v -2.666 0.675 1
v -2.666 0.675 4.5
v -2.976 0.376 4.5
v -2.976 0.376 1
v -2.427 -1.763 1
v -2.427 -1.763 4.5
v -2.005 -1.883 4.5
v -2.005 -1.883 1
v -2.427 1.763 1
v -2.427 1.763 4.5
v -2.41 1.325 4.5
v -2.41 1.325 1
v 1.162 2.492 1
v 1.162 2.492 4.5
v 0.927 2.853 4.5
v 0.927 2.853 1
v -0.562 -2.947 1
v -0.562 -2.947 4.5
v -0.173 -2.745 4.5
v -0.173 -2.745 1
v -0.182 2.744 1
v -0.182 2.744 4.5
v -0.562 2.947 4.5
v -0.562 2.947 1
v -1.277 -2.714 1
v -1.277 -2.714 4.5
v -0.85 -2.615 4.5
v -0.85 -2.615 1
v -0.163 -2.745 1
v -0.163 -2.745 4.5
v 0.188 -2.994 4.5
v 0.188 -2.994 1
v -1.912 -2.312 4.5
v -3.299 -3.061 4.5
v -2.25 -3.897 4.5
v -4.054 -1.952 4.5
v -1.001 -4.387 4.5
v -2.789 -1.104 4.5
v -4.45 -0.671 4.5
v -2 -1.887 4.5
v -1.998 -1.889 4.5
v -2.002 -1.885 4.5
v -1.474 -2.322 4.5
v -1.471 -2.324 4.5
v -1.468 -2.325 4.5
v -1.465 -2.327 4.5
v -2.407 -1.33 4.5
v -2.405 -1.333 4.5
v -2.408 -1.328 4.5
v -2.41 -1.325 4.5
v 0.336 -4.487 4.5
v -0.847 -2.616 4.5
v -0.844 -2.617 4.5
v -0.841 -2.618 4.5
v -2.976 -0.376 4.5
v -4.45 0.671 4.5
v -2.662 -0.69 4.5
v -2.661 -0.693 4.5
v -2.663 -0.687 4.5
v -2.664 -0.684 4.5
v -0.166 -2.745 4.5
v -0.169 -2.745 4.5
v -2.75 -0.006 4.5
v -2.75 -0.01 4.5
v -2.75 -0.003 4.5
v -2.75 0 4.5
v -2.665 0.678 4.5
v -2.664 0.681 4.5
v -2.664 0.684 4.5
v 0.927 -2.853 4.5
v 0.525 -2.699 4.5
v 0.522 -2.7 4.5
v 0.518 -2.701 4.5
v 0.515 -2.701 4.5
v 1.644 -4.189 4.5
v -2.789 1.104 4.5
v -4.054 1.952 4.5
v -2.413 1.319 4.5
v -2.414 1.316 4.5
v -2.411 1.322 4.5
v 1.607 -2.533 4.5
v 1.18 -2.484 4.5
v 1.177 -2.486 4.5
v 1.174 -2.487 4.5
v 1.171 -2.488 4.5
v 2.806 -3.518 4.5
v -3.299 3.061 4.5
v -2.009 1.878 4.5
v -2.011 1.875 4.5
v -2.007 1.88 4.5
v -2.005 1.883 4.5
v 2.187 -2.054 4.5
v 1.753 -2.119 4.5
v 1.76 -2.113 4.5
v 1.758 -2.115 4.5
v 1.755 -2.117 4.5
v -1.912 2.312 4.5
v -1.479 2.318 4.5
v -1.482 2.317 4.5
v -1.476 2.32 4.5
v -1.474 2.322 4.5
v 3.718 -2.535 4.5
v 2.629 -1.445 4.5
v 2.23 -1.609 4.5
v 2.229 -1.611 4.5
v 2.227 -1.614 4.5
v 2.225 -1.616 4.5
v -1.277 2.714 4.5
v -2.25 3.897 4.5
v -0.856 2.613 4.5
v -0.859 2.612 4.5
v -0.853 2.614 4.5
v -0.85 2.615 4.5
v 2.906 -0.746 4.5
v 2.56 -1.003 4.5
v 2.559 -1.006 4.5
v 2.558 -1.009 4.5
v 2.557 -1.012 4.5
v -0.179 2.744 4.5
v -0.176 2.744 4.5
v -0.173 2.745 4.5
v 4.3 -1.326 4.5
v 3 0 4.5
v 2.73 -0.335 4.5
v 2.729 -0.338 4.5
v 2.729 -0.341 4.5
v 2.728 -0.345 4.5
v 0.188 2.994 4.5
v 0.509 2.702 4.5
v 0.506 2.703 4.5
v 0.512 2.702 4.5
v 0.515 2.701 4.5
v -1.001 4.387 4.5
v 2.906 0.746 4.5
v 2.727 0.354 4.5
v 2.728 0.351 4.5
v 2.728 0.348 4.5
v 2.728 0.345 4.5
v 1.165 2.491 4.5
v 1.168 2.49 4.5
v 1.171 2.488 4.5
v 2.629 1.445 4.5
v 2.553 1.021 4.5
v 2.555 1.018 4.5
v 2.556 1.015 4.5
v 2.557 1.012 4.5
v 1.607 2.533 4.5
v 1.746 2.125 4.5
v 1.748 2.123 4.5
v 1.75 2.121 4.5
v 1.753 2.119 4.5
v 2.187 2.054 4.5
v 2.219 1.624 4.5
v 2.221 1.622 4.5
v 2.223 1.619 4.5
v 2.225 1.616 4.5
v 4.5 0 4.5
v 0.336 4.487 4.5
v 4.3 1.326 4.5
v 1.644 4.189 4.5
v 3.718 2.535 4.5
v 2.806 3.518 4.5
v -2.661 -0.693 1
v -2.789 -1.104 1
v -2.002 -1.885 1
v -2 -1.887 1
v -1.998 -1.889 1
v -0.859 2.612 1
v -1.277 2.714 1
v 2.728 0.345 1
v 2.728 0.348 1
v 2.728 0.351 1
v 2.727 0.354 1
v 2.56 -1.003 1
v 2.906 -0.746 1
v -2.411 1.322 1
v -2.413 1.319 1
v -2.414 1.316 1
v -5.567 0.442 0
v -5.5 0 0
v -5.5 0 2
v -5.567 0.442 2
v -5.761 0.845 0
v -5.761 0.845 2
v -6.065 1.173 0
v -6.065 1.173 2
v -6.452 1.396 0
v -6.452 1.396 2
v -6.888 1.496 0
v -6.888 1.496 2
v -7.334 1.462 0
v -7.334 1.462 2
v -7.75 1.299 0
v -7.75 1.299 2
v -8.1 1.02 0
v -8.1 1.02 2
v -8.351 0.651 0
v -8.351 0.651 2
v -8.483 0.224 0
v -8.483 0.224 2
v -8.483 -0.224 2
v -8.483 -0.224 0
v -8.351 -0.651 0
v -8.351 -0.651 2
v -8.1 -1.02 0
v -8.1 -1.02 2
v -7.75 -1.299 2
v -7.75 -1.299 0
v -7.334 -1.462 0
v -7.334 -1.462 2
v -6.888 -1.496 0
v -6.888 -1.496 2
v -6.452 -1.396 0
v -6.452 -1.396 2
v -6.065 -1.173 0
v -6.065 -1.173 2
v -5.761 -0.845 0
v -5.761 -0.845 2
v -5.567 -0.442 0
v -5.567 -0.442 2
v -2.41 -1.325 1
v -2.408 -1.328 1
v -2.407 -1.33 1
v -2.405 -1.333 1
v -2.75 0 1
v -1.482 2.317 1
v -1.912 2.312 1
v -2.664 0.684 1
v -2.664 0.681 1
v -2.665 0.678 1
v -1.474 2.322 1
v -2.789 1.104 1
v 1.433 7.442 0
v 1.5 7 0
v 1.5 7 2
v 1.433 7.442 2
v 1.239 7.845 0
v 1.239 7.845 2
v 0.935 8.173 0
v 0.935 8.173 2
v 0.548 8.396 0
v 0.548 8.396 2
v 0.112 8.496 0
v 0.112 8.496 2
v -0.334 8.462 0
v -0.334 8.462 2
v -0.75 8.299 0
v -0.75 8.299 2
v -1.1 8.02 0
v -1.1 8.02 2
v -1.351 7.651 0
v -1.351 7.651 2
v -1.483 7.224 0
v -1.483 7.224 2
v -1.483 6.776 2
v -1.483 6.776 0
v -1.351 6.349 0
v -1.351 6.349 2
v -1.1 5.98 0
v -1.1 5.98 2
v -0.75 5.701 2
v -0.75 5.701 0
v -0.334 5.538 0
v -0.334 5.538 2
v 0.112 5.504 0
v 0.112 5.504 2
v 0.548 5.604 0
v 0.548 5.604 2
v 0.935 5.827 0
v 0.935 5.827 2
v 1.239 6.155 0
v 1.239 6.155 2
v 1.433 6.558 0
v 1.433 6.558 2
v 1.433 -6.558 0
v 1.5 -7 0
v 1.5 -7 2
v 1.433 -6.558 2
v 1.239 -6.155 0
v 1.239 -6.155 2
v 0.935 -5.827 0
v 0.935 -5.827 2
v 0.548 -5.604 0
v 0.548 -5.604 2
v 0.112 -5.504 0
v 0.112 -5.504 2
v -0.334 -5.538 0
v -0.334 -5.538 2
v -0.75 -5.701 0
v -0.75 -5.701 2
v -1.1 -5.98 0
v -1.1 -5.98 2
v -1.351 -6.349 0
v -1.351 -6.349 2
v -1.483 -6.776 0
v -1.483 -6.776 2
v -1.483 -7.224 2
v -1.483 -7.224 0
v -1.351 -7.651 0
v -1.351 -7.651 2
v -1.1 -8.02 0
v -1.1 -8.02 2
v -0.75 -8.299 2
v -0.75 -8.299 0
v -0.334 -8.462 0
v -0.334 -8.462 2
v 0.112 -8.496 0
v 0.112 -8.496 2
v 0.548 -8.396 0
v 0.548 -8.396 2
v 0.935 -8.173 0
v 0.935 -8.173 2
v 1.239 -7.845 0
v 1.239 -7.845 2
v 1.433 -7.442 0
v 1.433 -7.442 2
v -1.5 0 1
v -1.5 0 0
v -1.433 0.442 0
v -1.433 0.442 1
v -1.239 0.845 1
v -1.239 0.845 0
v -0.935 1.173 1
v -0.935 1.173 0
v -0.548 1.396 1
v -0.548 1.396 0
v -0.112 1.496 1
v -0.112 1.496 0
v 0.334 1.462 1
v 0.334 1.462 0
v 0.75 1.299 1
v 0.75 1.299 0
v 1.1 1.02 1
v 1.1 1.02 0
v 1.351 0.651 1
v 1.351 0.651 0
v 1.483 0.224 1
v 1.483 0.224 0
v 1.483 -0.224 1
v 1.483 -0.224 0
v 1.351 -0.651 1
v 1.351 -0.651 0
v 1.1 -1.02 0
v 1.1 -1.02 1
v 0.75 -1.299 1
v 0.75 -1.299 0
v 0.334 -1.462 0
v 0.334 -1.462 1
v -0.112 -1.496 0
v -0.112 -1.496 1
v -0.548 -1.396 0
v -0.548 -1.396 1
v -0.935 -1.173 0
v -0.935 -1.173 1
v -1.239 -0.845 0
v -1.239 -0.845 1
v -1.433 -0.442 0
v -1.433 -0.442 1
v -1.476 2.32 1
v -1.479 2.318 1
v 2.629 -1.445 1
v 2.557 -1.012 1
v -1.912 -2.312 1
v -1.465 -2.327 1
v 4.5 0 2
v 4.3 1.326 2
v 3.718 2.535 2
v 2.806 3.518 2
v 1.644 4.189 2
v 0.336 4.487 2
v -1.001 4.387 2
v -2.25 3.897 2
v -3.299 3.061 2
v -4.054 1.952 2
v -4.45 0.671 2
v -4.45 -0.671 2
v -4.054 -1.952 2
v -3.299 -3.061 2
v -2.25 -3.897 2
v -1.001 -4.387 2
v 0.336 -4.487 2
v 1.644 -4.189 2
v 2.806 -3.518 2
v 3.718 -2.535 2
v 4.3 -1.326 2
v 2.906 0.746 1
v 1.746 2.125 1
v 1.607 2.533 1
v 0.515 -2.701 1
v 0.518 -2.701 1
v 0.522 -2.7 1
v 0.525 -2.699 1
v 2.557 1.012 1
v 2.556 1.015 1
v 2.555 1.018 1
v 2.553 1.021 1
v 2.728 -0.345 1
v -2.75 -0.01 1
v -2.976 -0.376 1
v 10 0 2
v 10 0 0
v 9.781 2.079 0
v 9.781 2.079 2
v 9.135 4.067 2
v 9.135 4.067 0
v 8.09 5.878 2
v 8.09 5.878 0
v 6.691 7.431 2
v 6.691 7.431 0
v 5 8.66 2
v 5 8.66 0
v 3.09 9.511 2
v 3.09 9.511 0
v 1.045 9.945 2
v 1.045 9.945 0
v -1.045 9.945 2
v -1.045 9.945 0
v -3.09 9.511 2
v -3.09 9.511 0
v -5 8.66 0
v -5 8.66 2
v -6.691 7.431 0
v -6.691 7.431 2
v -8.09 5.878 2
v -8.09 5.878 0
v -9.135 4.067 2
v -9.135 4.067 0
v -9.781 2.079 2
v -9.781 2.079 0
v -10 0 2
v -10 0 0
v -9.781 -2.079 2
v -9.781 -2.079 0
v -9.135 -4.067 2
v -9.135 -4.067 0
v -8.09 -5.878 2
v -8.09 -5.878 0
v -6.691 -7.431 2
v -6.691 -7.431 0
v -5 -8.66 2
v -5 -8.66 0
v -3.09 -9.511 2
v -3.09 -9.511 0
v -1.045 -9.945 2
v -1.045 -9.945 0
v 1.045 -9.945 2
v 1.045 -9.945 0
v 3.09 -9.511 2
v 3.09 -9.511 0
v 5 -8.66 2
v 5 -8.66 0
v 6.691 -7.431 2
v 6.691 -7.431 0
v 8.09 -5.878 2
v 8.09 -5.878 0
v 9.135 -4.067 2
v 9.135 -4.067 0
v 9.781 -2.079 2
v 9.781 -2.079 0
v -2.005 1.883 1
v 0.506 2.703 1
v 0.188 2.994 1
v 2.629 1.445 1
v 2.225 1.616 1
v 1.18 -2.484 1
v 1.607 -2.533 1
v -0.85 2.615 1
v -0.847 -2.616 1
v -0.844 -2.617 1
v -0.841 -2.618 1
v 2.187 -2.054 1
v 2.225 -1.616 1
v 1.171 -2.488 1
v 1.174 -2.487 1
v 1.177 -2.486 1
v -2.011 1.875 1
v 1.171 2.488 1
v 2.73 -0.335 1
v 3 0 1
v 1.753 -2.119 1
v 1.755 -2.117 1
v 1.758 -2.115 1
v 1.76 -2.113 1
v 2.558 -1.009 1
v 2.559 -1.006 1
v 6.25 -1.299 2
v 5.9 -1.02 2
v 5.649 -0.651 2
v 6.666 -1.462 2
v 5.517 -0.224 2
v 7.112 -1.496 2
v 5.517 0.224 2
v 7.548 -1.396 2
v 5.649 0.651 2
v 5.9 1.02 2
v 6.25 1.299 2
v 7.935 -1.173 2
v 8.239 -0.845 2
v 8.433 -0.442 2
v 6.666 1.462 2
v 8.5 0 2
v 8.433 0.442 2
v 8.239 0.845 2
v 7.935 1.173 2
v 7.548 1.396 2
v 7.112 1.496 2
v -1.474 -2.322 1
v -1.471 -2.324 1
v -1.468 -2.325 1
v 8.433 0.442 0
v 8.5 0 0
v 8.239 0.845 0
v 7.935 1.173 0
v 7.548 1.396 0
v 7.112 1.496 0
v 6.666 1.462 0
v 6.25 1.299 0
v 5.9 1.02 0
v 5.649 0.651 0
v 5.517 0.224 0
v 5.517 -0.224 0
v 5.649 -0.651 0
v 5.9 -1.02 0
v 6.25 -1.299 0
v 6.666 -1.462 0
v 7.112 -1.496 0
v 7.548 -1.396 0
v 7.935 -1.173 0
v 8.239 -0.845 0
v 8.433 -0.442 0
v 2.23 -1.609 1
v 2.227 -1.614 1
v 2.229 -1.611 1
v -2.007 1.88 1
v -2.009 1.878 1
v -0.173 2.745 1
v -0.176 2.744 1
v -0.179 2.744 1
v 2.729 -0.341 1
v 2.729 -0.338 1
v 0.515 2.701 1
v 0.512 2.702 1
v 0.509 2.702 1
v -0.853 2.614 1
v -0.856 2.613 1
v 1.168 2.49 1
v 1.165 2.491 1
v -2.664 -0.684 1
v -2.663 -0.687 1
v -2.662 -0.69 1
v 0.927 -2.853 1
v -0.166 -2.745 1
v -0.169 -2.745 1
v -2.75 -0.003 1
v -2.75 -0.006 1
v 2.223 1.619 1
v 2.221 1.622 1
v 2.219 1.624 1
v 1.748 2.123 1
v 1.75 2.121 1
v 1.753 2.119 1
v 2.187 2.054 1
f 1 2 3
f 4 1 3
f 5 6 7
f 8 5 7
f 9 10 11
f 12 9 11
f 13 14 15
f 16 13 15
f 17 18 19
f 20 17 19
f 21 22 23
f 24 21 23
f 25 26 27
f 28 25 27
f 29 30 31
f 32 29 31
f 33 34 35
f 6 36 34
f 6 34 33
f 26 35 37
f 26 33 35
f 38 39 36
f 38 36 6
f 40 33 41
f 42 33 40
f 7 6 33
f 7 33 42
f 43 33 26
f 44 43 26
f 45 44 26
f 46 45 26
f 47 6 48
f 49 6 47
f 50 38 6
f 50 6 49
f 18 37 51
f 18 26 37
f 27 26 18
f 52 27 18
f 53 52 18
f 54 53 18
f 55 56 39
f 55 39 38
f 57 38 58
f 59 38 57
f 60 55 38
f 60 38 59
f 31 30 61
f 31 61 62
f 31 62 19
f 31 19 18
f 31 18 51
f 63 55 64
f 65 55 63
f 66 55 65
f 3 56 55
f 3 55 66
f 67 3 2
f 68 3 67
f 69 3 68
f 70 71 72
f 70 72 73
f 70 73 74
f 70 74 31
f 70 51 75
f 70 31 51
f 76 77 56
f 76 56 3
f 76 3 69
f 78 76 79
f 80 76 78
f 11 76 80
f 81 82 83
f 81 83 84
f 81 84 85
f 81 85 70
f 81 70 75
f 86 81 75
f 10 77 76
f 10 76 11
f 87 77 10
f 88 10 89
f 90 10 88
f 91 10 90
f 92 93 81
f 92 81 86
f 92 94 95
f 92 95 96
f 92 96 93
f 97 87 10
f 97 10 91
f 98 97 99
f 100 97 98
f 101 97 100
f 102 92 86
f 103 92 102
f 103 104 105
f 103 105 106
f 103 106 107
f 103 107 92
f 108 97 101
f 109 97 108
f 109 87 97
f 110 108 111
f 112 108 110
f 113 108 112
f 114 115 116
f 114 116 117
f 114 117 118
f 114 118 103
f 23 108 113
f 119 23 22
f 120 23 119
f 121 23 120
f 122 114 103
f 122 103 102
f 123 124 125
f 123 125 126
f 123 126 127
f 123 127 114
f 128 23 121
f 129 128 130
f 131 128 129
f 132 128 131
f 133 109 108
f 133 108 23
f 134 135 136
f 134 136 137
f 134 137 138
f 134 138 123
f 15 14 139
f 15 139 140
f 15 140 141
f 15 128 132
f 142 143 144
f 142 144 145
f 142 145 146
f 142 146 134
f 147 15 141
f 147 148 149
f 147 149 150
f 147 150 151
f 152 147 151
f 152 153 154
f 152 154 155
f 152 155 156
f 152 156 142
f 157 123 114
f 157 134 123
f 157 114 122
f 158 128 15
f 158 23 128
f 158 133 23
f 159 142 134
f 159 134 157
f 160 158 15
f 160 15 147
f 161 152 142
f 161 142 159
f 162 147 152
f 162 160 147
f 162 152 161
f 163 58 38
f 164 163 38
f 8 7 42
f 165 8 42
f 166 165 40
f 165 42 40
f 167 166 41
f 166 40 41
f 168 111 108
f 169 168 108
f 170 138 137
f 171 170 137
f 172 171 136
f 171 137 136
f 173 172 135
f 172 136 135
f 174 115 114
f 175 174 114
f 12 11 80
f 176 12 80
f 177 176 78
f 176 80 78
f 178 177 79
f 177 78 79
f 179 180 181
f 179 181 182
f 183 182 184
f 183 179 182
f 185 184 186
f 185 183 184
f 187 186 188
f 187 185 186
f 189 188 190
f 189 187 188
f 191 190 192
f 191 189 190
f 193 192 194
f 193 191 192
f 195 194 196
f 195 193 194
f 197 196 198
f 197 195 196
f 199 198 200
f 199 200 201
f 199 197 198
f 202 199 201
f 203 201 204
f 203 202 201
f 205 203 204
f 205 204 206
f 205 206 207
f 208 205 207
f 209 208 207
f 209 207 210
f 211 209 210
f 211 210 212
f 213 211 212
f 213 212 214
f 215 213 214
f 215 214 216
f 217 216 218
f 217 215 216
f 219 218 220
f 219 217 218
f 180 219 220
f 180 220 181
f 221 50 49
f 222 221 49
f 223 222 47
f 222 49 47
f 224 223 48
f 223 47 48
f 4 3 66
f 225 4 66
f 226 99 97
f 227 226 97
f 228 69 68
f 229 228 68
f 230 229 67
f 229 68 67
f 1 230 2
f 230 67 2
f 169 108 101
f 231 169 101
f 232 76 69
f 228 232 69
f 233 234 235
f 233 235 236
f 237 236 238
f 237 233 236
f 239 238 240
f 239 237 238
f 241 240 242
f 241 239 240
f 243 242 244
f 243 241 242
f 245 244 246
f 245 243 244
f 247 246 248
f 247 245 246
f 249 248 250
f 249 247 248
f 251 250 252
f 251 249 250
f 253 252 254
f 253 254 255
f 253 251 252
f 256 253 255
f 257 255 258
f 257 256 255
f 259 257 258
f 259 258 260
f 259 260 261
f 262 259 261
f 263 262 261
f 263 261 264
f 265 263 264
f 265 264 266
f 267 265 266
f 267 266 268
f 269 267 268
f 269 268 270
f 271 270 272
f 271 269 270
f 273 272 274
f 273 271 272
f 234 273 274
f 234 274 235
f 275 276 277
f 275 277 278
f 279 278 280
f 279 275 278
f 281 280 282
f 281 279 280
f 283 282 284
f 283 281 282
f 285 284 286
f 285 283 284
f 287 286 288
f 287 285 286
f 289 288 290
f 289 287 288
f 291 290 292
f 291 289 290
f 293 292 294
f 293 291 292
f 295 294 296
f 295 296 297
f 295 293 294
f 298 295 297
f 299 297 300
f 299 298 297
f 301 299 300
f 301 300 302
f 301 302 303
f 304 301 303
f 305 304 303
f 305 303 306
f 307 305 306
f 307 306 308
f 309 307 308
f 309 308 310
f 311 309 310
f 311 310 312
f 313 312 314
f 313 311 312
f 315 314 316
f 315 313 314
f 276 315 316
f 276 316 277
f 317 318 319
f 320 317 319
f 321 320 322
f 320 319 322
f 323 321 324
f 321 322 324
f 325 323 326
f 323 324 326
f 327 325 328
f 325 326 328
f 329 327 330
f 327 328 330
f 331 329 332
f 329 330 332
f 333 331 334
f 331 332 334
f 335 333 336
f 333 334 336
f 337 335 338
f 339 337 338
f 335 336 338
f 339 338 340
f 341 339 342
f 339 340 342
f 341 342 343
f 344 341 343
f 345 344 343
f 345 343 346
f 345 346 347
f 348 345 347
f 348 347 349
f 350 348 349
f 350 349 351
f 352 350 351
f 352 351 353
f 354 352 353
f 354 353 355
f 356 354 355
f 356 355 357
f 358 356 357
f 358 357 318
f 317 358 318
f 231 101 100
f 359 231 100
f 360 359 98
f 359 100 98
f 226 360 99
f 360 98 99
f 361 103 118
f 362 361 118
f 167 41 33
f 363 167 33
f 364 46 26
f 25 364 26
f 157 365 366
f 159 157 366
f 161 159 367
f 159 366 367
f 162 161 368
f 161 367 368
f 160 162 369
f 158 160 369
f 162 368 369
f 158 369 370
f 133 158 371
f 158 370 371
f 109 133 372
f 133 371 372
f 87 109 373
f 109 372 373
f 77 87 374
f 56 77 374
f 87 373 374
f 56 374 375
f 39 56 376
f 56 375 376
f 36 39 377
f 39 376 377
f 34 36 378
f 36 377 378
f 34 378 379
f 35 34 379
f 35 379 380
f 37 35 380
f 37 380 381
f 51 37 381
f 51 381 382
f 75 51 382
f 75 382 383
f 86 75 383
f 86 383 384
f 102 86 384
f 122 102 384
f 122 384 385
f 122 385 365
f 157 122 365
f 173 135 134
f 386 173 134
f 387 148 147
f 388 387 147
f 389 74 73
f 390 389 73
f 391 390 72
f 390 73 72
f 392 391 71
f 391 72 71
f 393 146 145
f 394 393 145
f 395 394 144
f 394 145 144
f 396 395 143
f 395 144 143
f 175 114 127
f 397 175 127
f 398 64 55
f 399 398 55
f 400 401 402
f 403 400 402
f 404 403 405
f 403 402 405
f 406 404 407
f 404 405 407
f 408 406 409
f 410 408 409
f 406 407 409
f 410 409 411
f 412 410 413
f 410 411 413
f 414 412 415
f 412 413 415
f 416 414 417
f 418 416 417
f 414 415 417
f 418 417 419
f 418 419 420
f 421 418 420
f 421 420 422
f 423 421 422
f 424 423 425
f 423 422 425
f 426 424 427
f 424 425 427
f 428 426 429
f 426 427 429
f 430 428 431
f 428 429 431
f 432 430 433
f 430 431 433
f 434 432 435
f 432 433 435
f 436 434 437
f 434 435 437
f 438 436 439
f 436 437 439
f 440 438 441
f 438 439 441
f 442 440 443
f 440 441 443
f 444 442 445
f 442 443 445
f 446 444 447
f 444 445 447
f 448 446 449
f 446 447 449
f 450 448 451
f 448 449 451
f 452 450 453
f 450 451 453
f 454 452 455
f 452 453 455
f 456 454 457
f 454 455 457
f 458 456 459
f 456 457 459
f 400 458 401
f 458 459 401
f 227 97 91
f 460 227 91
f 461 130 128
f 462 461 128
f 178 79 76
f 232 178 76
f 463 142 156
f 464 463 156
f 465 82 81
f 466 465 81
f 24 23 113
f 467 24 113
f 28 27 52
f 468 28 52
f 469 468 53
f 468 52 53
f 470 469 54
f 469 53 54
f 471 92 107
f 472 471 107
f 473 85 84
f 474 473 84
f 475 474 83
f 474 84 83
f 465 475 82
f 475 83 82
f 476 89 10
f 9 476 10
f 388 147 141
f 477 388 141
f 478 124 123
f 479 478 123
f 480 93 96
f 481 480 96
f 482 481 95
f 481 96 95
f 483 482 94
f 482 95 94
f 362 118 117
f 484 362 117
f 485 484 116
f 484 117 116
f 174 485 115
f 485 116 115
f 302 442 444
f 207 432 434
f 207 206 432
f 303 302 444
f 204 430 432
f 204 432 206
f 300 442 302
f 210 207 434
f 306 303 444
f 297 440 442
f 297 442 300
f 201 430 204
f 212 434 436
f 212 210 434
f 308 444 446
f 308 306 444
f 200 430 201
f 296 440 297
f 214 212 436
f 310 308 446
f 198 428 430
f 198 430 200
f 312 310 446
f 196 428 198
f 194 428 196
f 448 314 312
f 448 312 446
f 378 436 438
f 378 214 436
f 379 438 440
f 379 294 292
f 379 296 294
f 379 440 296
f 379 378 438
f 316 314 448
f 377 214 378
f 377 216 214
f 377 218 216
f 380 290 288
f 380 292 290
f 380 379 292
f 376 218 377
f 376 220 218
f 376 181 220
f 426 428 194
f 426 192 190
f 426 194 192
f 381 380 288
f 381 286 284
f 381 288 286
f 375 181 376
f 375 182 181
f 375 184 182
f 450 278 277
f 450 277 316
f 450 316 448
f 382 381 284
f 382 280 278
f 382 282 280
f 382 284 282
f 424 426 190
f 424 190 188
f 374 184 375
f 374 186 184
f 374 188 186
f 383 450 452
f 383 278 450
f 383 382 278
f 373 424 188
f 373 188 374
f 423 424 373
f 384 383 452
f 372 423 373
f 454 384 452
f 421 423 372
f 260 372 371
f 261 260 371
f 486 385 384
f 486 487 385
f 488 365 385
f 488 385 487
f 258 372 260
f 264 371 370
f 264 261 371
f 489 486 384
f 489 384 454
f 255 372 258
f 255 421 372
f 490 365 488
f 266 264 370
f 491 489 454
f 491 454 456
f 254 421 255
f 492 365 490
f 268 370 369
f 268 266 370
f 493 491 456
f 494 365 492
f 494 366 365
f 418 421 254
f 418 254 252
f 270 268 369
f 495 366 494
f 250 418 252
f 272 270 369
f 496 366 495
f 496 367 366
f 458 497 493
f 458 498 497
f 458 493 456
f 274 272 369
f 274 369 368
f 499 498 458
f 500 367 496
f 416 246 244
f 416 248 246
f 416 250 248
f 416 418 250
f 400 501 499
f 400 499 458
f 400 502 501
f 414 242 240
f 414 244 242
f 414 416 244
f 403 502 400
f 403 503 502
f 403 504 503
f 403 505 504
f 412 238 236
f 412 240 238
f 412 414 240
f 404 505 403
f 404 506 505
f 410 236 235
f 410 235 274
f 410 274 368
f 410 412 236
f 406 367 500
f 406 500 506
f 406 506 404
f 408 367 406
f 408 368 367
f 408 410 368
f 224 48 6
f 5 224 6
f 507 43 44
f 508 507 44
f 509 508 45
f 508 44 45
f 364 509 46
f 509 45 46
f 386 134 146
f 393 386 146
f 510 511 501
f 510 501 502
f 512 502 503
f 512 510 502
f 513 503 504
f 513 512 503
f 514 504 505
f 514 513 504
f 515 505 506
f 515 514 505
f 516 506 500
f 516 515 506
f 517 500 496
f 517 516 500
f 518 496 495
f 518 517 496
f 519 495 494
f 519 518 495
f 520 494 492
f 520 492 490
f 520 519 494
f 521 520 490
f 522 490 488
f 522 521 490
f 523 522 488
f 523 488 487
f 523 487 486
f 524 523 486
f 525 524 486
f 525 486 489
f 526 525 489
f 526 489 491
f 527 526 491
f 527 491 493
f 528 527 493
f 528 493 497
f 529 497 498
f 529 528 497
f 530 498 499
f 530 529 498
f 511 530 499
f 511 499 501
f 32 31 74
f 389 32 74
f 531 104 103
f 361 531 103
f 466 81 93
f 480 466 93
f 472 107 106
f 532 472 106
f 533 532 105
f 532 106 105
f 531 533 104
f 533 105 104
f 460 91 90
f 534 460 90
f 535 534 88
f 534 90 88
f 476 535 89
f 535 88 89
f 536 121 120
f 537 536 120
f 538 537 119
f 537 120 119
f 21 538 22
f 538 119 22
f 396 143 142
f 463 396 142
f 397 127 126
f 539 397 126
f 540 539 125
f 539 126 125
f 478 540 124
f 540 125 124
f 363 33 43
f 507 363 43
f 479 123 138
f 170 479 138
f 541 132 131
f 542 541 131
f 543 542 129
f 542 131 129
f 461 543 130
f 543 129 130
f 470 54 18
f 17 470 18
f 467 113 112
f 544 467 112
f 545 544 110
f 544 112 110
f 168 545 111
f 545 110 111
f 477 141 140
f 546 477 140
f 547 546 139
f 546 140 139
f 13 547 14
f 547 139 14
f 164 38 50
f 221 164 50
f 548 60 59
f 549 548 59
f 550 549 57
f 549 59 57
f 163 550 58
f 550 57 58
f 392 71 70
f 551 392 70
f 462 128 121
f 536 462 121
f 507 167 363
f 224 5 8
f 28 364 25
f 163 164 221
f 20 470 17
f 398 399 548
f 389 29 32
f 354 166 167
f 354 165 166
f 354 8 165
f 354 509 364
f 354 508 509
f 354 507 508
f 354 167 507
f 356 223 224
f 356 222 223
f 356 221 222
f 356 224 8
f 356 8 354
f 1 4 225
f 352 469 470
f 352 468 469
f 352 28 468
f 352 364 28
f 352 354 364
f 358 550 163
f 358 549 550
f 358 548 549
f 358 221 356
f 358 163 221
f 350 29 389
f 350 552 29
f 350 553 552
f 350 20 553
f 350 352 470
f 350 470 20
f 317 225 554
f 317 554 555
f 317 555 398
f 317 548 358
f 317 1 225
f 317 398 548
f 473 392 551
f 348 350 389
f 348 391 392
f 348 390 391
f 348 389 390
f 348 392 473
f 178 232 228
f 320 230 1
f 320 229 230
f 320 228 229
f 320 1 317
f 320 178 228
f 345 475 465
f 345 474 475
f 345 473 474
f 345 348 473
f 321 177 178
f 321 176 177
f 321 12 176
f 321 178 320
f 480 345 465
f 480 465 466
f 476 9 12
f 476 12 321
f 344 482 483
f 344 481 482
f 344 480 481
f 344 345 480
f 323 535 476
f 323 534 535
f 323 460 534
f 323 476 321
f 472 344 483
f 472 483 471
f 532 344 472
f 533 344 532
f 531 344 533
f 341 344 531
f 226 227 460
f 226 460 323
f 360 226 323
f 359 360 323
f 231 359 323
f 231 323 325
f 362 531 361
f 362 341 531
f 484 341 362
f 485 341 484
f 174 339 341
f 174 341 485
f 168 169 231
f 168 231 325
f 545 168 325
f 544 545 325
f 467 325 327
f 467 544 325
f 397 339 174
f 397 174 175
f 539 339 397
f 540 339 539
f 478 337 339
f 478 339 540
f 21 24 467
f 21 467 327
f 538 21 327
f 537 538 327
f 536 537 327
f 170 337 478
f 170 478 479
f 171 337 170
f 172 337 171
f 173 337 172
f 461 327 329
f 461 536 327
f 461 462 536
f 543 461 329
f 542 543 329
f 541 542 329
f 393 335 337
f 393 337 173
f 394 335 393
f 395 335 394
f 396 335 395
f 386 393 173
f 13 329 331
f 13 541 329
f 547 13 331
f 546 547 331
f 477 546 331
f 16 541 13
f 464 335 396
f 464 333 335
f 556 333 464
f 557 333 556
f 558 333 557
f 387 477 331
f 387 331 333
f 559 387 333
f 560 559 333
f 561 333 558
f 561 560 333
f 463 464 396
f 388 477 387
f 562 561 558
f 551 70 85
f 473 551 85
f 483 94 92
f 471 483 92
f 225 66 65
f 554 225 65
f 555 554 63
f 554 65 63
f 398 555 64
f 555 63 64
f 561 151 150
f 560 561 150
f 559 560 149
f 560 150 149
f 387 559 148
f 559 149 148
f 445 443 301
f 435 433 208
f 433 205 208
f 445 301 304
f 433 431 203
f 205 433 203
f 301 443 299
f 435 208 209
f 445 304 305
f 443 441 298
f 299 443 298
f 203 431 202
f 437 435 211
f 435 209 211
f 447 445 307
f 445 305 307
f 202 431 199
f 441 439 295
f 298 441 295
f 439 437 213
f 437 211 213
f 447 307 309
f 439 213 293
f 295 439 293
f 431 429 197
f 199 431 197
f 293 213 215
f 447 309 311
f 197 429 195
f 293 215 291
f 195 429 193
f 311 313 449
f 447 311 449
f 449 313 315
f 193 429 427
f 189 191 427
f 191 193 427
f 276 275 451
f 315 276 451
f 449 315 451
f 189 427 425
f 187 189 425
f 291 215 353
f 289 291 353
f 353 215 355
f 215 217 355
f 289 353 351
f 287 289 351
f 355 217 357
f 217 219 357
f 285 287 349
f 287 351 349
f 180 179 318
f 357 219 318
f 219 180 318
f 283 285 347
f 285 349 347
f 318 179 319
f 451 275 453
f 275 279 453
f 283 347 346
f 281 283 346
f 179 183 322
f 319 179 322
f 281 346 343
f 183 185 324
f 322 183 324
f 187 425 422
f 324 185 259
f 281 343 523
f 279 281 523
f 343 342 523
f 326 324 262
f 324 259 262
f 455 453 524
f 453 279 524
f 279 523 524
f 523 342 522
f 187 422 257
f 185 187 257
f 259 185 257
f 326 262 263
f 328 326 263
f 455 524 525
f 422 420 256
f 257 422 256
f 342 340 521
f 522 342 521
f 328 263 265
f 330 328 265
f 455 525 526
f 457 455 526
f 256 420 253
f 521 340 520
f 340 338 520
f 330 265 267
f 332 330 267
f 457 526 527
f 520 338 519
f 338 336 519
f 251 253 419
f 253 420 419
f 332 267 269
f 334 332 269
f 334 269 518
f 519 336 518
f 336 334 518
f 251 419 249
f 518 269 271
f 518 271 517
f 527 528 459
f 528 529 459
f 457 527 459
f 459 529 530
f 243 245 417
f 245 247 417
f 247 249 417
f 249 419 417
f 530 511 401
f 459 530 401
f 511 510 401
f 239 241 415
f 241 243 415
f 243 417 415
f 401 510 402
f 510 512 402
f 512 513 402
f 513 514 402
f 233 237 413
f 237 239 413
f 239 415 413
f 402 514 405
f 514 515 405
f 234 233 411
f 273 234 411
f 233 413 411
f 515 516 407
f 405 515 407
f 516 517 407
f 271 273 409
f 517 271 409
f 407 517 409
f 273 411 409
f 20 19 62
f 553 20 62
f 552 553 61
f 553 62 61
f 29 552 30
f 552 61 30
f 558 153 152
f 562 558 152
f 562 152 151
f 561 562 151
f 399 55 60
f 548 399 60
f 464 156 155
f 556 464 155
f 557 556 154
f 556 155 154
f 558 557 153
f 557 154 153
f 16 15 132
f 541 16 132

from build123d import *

# Parameters (mm, degrees)
SKETCH1_R           = 10
SKETCH1_R_2         = 1.5
SKETCH1_R_3         = 4.5
BOSS_EXTRUDE1_DEPTH = 2
SKETCH1_2_R         = 4.5
BOSS_EXTRUDE2_DEPTH = 4.5
SKETCH2_R           = 1.5
CUT_EXTRUDE1_DEPTH  = 4.5
SKETCH3_R           = 2.75
CUT_EXTRUDE2_DEPTH  = 3.5
CUT_EXTRUDE3_DEPTH  = 3.5
CIRPATTERN1_COUNT   = 25


with BuildPart() as part:
    # Sketch1 → Boss-Extrude1 (new body)
    with BuildSketch(Plane.XY):
        Circle(SKETCH1_R)
        with Locations((0, 7)):
            Circle(SKETCH1_R_2, mode=Mode.SUBTRACT)
        with Locations((7, 0)):
            Circle(SKETCH1_R_2, mode=Mode.SUBTRACT)
        with Locations((0, -7)):
            Circle(SKETCH1_R_2, mode=Mode.SUBTRACT)
        with Locations((-7, 0)):
            Circle(SKETCH1_R_2, mode=Mode.SUBTRACT)
        Circle(SKETCH1_R_3, mode=Mode.SUBTRACT)
    extrude(amount=BOSS_EXTRUDE1_DEPTH)

    # Sketch1<2> → Boss-Extrude2 (add)
    with BuildSketch(Plane.XY):
        Circle(SKETCH1_2_R)
    extrude(amount=BOSS_EXTRUDE2_DEPTH)

    # Sketch2 → Cut-Extrude1 (cut)
    with BuildSketch(Plane(origin=(0, 0, 0), x_dir=(-1, 0, 0), z_dir=(0, 0, -1))):
        Circle(SKETCH2_R)
    extrude(amount=-CUT_EXTRUDE1_DEPTH, mode=Mode.SUBTRACT)

    # Sketch3 → Cut-Extrude2 (cut)
    with BuildSketch(Plane.XY.offset(4.5)):
        Circle(SKETCH3_R)
    extrude(amount=-CUT_EXTRUDE2_DEPTH, mode=Mode.SUBTRACT)

    # Sketch4 → Cut-Extrude3 (cut)
    with BuildSketch(Plane.XY.offset(4.5)):
        with BuildLine():
            Line((-2.976344104, 0.375999701), (-2.75, 0))
            ThreePointArc((-2.75, 0), (-2.728912829, 0.339904061), (-2.665974712, 0.674595311))
            Line((-2.665974712, 0.674595311), (-2.976344104, 0.375999701))
        make_face()
    cut_extrude3 = extrude(amount=-CUT_EXTRUDE3_DEPTH, mode=Mode.SUBTRACT)

    # CirPattern1: Cut-Extrude3 ×25 about axis
    cirpattern1_axis = Axis((0, 0, 4.5), (0, 0, -1))
    for i in range(1, CIRPATTERN1_COUNT):
        add(cut_extrude3.rotate(cirpattern1_axis, i * 360 / CIRPATTERN1_COUNT), mode=Mode.SUBTRACT)


solid = part.part
